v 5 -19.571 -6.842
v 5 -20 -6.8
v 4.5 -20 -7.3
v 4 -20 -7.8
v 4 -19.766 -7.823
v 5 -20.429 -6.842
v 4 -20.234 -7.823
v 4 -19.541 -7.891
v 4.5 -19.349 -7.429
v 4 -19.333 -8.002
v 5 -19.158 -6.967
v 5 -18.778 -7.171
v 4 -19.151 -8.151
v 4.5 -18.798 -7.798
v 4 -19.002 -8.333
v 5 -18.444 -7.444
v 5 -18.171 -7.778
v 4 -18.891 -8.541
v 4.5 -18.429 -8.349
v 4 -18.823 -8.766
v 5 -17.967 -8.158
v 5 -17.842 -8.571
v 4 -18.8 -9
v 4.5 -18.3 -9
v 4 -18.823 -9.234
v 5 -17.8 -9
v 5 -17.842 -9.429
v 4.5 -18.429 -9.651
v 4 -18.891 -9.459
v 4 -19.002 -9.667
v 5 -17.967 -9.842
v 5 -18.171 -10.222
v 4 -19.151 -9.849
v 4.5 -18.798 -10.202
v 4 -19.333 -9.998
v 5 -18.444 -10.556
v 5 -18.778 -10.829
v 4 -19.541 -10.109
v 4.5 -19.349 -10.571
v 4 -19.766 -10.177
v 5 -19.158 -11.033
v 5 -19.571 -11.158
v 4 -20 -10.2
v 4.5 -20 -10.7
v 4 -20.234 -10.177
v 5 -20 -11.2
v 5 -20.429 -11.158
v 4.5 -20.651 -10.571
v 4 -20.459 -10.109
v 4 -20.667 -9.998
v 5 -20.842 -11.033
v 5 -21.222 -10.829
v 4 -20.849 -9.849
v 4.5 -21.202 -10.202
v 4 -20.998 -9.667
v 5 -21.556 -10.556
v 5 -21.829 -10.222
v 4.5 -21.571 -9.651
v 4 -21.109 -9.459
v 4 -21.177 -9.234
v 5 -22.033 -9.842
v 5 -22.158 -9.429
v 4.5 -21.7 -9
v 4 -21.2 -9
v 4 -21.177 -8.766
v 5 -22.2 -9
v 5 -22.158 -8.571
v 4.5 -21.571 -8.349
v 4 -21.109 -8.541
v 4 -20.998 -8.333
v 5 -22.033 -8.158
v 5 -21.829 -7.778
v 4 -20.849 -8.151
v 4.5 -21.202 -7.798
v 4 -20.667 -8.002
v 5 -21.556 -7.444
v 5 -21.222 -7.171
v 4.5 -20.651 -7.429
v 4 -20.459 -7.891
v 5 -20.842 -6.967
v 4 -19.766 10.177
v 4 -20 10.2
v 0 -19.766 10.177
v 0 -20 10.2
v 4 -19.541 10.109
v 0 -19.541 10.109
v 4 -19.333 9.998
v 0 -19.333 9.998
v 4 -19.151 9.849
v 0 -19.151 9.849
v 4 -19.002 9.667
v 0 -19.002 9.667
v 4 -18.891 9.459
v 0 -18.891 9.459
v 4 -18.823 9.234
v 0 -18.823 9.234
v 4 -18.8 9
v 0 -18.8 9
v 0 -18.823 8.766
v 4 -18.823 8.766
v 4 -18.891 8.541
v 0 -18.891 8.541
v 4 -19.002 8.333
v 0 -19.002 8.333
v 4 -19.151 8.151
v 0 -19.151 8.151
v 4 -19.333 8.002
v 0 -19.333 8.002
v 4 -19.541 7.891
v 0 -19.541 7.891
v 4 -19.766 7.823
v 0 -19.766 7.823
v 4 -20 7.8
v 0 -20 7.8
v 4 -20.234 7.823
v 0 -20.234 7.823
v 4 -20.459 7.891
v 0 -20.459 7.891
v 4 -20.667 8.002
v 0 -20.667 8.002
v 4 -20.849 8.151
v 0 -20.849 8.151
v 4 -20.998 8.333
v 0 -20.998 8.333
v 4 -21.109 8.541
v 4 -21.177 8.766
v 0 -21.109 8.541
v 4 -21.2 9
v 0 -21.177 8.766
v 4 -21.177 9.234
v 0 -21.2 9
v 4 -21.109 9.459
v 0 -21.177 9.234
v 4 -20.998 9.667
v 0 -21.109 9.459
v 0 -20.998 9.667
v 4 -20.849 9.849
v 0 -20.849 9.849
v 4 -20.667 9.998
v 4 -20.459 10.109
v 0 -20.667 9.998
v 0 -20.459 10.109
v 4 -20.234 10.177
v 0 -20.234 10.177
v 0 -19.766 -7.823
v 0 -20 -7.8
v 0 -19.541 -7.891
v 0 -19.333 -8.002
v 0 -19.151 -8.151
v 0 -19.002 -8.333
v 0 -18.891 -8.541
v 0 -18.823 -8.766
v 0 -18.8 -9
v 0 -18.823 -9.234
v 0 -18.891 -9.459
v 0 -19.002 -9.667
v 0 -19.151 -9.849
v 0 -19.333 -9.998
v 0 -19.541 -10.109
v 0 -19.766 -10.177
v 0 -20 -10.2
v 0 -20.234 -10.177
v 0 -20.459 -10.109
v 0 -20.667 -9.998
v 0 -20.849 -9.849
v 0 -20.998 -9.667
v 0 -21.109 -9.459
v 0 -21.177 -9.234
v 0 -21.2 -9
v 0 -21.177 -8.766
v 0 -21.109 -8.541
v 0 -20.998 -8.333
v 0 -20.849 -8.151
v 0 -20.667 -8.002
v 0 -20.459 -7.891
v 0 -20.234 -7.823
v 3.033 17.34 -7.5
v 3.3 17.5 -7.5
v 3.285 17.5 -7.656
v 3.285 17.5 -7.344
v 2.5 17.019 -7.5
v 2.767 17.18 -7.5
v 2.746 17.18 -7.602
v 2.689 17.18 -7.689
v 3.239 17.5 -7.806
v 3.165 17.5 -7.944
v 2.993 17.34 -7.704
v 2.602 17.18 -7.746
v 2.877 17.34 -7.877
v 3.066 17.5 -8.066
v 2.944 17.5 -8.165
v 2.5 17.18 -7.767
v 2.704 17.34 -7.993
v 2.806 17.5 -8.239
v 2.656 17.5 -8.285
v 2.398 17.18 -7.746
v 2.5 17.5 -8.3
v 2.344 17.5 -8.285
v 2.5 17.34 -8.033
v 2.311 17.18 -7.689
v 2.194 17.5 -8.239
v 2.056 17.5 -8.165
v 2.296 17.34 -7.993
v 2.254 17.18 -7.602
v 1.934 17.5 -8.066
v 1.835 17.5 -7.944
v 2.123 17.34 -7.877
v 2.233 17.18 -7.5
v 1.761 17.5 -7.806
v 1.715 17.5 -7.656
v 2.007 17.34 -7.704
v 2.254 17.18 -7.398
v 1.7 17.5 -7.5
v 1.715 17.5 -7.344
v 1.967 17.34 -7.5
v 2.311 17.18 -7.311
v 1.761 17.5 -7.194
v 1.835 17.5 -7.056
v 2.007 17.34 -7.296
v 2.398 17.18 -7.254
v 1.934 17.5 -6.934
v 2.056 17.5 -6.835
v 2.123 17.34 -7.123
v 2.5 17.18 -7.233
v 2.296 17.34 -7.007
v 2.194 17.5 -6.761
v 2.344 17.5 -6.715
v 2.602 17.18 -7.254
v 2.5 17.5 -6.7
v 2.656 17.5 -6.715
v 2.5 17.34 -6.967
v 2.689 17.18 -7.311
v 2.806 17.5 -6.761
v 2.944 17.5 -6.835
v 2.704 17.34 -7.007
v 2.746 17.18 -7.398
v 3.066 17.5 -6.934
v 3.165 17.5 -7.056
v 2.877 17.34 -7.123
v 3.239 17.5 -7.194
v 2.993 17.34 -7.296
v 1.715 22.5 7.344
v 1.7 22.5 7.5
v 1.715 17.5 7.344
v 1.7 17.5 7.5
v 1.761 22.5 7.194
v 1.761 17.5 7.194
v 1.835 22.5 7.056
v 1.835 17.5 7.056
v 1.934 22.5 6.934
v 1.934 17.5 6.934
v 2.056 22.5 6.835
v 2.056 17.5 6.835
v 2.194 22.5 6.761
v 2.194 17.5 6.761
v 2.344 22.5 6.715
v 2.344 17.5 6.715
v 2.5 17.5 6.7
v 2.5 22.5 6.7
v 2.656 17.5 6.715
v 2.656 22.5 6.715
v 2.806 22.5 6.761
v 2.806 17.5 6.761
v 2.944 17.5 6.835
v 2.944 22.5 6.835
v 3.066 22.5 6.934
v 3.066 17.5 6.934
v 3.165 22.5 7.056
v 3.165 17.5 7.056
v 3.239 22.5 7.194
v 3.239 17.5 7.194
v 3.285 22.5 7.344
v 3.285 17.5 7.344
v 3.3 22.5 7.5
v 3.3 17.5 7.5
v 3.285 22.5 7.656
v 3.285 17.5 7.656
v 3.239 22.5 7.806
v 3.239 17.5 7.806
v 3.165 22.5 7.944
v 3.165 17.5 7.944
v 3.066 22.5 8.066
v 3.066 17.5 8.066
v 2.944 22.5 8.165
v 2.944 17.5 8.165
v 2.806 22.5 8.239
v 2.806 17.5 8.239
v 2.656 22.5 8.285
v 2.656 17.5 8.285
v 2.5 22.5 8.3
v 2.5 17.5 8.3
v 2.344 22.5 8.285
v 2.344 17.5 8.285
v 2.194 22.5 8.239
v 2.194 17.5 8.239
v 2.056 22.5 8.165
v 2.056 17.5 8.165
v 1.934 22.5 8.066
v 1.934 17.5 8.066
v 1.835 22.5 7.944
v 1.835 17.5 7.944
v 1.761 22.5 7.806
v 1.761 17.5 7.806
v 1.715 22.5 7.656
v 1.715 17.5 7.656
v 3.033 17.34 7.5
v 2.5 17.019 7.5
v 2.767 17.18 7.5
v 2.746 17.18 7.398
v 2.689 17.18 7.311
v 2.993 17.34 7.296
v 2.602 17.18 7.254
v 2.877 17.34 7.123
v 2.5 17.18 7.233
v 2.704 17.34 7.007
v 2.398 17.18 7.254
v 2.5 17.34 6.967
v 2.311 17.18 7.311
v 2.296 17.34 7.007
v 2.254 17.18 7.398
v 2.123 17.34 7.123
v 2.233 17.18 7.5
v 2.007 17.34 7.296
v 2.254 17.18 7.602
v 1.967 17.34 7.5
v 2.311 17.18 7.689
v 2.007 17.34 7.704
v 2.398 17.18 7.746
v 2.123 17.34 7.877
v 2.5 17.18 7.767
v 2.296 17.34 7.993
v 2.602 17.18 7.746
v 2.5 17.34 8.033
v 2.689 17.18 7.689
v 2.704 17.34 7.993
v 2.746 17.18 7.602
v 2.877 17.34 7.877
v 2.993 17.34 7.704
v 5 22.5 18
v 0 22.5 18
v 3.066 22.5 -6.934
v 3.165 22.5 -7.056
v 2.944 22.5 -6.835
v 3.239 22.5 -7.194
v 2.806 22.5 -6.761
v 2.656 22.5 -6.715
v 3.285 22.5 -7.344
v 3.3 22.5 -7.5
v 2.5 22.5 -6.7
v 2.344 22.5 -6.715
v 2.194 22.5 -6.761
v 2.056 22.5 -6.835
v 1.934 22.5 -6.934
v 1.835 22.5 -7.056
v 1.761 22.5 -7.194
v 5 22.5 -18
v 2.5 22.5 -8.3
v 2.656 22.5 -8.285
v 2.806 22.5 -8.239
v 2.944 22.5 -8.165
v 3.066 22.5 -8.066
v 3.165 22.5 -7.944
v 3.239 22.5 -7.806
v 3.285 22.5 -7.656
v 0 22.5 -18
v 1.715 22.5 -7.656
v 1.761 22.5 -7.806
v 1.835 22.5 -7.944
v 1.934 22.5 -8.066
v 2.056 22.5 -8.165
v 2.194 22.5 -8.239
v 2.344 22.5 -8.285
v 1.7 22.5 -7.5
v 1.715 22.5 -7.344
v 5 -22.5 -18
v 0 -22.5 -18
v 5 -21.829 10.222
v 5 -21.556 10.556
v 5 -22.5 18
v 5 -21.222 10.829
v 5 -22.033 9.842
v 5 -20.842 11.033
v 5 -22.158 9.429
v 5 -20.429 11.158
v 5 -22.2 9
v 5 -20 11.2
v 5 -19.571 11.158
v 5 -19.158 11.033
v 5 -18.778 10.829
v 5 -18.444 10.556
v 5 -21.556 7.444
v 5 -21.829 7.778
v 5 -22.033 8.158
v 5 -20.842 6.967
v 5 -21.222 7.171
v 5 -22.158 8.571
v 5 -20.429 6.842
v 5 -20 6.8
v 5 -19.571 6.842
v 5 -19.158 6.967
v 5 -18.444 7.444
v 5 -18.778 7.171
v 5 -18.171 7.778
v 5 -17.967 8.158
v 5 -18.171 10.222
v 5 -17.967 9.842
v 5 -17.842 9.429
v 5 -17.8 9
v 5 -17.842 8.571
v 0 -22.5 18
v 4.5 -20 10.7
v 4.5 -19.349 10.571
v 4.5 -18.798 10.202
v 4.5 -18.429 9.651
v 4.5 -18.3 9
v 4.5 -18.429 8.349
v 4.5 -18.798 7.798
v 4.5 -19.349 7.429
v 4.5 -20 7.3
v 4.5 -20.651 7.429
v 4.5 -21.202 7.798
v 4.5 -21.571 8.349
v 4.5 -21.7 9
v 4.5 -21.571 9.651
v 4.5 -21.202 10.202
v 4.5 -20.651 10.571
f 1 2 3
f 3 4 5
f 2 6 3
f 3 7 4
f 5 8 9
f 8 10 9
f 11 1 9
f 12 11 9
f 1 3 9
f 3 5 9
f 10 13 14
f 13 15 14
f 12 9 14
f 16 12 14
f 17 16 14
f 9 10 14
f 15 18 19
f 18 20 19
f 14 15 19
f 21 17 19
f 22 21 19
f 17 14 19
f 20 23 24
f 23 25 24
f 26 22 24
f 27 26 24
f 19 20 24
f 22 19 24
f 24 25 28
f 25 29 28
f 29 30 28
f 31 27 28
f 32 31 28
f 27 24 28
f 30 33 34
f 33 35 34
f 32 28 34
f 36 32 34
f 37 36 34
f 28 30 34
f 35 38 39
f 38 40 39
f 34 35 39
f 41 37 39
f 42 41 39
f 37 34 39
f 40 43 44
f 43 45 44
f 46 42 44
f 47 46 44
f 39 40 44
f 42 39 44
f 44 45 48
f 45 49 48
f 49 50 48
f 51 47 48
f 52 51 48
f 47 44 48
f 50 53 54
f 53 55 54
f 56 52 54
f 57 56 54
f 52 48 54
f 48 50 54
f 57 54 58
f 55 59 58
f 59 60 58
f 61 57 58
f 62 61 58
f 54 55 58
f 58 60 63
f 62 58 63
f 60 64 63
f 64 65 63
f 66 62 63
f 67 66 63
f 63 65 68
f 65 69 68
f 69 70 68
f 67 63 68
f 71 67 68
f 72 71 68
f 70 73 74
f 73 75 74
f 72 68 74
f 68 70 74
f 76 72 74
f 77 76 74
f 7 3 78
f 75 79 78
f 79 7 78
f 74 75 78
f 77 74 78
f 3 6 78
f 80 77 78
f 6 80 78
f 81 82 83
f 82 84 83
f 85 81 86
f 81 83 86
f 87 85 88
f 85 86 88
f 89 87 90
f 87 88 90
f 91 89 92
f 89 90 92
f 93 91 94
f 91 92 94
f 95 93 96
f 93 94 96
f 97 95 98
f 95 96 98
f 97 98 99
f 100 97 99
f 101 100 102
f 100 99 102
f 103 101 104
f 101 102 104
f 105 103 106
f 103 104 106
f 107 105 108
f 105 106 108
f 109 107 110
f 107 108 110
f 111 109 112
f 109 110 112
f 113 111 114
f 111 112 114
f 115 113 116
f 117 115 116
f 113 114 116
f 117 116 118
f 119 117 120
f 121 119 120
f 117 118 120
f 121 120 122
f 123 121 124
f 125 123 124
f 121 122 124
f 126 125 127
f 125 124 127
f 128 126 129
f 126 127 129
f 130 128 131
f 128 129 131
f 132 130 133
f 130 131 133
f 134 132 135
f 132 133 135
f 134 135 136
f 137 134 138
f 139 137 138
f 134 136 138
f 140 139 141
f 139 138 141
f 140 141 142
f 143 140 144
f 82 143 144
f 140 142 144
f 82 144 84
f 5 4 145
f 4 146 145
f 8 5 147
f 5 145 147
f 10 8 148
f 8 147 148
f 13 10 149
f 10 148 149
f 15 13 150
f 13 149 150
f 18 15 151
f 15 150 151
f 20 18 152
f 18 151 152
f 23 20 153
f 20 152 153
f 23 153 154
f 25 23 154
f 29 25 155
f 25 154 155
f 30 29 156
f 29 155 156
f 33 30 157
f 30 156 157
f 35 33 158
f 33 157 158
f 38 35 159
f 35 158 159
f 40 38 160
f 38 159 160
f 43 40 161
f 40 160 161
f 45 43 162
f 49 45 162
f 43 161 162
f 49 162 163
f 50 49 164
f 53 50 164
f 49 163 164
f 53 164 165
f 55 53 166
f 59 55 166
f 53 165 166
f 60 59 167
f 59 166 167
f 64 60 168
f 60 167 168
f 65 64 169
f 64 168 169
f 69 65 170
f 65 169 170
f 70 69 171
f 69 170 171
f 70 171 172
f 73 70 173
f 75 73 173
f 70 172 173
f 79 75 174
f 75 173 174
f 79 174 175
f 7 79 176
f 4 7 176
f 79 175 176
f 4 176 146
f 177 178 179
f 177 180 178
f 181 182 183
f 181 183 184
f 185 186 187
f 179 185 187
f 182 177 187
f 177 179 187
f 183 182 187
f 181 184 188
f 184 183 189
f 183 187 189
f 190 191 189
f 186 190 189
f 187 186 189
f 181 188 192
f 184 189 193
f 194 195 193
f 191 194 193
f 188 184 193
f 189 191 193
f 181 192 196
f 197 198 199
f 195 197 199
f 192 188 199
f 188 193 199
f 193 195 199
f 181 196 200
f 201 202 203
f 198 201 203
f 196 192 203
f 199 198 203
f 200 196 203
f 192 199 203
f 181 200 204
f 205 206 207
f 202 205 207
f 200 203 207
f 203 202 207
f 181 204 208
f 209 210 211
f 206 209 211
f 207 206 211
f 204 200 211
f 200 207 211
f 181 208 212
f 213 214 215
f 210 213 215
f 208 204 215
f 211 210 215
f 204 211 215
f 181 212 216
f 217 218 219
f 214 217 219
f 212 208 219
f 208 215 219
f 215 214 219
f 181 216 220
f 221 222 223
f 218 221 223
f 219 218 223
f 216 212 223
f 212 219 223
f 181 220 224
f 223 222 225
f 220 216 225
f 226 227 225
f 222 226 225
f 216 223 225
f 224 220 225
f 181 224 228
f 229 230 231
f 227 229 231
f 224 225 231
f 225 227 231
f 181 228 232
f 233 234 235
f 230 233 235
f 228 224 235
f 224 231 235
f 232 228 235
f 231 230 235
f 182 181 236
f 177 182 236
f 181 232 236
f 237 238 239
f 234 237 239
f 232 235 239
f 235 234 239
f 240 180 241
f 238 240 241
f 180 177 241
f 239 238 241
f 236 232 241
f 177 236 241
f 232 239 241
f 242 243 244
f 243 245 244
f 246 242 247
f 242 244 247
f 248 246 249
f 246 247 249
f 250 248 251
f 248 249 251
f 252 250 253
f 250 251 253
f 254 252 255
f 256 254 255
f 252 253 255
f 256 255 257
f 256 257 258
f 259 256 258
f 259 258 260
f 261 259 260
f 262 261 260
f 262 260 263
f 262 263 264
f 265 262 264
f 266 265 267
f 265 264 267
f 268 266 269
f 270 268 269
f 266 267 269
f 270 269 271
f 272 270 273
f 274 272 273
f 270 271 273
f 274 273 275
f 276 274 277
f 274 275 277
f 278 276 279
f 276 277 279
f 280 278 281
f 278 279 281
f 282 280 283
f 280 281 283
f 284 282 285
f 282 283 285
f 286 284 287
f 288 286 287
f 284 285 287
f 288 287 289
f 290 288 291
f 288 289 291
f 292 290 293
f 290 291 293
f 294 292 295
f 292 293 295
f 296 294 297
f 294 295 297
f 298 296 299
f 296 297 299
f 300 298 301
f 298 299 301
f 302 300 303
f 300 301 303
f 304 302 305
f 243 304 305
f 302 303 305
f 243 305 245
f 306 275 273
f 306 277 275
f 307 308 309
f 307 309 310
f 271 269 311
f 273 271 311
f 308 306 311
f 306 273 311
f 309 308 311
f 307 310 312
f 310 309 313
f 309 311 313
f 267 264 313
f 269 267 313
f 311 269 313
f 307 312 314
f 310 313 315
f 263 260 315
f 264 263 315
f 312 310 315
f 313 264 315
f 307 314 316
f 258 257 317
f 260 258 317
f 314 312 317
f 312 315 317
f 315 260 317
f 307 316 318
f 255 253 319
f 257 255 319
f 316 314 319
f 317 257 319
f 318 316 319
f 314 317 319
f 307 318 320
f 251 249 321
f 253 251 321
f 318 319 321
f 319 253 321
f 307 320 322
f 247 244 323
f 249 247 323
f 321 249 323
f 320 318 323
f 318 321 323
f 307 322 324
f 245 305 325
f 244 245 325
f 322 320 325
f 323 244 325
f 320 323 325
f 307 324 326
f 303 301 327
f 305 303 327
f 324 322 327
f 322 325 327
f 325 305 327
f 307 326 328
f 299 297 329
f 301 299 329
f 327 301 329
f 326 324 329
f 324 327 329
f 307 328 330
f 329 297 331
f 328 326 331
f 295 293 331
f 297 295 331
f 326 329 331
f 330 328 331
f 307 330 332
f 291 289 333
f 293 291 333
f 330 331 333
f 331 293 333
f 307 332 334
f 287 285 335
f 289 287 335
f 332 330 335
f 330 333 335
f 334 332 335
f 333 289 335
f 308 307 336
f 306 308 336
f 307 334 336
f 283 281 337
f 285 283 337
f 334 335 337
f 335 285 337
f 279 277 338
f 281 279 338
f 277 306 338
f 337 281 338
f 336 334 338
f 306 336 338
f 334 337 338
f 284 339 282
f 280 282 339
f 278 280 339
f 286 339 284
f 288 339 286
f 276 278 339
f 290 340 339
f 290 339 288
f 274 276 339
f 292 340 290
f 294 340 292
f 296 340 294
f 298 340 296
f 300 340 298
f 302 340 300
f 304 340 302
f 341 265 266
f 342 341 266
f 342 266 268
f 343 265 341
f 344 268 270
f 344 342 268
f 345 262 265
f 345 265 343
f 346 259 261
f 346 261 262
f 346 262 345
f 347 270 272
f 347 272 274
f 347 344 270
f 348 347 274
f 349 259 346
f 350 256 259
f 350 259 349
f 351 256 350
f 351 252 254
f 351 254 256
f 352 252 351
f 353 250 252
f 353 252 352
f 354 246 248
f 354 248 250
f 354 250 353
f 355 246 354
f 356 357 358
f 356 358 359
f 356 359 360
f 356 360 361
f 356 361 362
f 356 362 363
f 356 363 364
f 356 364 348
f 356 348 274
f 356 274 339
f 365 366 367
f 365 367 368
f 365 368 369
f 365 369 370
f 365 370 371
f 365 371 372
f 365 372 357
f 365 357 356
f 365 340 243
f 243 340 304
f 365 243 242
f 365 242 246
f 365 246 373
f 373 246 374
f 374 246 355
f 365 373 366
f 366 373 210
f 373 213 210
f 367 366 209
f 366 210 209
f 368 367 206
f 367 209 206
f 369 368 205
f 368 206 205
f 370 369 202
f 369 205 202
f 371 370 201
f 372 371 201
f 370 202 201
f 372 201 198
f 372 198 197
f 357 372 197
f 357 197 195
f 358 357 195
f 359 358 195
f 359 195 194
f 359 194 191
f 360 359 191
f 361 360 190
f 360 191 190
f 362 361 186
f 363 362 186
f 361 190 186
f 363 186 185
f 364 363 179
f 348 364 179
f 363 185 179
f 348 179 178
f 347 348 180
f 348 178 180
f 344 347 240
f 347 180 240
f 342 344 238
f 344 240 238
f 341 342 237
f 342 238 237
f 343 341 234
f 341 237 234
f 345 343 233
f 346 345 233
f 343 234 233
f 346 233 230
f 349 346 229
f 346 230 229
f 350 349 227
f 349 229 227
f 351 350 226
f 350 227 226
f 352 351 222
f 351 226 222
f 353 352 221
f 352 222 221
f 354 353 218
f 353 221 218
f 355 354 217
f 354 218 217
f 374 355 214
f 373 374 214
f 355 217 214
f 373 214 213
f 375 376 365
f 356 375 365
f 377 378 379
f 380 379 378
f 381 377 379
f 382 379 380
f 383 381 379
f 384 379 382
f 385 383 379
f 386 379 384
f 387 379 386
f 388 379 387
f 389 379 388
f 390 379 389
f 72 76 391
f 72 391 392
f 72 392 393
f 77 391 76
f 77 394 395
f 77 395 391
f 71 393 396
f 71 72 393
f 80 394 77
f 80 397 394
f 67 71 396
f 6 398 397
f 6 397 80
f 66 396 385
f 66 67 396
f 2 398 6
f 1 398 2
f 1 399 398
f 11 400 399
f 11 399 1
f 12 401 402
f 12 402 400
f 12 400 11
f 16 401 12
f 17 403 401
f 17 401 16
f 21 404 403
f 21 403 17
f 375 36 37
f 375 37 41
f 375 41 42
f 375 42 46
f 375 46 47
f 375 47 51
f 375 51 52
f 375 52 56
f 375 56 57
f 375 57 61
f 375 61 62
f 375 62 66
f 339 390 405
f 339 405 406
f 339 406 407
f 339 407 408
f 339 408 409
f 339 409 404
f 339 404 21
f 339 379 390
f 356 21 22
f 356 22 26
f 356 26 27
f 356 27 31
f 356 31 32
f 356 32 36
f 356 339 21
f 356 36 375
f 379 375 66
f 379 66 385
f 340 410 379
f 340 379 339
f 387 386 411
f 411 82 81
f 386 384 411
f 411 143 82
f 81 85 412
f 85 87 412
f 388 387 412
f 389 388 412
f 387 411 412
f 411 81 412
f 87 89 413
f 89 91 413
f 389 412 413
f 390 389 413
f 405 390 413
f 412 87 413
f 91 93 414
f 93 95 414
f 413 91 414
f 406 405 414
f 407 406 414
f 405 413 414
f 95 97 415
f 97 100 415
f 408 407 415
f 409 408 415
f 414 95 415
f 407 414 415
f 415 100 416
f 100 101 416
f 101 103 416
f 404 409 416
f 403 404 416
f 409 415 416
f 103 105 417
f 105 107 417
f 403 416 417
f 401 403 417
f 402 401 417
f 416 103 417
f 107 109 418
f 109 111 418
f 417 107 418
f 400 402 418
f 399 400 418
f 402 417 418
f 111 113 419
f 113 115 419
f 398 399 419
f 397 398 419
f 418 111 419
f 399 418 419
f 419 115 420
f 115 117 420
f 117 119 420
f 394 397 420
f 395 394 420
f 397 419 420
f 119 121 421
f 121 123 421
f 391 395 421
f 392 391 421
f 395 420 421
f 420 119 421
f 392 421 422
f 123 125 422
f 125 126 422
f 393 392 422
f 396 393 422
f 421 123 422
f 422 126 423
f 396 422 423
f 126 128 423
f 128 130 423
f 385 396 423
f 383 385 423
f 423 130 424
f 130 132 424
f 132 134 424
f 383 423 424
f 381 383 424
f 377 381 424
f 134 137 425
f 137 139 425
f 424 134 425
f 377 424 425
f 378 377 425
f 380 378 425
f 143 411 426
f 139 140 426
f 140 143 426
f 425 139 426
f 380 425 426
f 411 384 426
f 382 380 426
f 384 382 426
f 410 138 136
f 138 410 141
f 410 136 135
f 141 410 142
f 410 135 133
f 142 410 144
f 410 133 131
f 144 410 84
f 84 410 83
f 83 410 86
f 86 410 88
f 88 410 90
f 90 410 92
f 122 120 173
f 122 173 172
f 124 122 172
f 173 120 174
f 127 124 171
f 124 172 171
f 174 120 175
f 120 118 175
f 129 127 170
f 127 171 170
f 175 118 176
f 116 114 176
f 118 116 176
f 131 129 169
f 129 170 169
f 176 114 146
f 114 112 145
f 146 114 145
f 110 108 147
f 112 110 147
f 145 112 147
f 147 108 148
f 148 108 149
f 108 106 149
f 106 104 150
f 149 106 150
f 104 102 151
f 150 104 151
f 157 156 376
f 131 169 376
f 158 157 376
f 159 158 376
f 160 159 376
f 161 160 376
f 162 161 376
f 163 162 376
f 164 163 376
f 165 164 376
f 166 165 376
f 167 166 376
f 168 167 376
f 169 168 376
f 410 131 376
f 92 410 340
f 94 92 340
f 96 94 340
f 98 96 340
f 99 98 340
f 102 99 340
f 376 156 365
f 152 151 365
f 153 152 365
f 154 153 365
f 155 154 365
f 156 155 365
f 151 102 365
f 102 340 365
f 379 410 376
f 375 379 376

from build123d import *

# Parameters (mm, degrees)
SKETCH1_W                                           = 36
SKETCH1_H                                           = 45
BOSS_EXTRUDE1_DEPTH                                 = 5
M2_TAPPED_HOLE1_D                                   = 1.6
M2_TAPPED_HOLE1_DEPTH                               = 5
M2_TAPPED_HOLE1_TIP                                 = 0.480688495
CSK_FOR_M2_COUNTERSUNK_FLAT_HEAD_SCREW1_D           = 2.4
CSK_FOR_M2_COUNTERSUNK_FLAT_HEAD_SCREW1_CSINK_D     = 4.4
CSK_FOR_M2_COUNTERSUNK_FLAT_HEAD_SCREW1_CSINK_ANGLE = 90


with BuildPart() as part:
    # Sketch1 → Boss-Extrude1 (new body)
    with BuildSketch(Plane(origin=(0, 0, 0), x_dir=(0, 0, -1), z_dir=(1, 0, 0))):
        Rectangle(SKETCH1_W, SKETCH1_H)
    extrude(amount=BOSS_EXTRUDE1_DEPTH)

    # M2 Tapped Hole1
    with Locations(Plane(origin=(0, 22.5, 0), x_dir=(1, 0, 0), z_dir=(0, 1, 0))):
        with Locations((2.5, 7.5), (2.5, -7.5)):
            Hole(M2_TAPPED_HOLE1_D / 2, depth=M2_TAPPED_HOLE1_DEPTH)
            with Locations((0, 0, -(M2_TAPPED_HOLE1_DEPTH + M2_TAPPED_HOLE1_TIP / 2))):  # 118° drill point
                Cone(0, M2_TAPPED_HOLE1_D / 2, M2_TAPPED_HOLE1_TIP, mode=Mode.SUBTRACT)

    # CSK for M2 Countersunk Flat Head Screw1 (through all)
    with Locations(Plane(origin=(5, 0, 0), x_dir=(0, 0, -1), z_dir=(1, 0, 0))):
        with Locations((-9, -20), (9, -20)):
            CounterSinkHole(CSK_FOR_M2_COUNTERSUNK_FLAT_HEAD_SCREW1_D / 2, CSK_FOR_M2_COUNTERSUNK_FLAT_HEAD_SCREW1_CSINK_D / 2, counter_sink_angle=CSK_FOR_M2_COUNTERSUNK_FLAT_HEAD_SCREW1_CSINK_ANGLE)


solid = part.part
